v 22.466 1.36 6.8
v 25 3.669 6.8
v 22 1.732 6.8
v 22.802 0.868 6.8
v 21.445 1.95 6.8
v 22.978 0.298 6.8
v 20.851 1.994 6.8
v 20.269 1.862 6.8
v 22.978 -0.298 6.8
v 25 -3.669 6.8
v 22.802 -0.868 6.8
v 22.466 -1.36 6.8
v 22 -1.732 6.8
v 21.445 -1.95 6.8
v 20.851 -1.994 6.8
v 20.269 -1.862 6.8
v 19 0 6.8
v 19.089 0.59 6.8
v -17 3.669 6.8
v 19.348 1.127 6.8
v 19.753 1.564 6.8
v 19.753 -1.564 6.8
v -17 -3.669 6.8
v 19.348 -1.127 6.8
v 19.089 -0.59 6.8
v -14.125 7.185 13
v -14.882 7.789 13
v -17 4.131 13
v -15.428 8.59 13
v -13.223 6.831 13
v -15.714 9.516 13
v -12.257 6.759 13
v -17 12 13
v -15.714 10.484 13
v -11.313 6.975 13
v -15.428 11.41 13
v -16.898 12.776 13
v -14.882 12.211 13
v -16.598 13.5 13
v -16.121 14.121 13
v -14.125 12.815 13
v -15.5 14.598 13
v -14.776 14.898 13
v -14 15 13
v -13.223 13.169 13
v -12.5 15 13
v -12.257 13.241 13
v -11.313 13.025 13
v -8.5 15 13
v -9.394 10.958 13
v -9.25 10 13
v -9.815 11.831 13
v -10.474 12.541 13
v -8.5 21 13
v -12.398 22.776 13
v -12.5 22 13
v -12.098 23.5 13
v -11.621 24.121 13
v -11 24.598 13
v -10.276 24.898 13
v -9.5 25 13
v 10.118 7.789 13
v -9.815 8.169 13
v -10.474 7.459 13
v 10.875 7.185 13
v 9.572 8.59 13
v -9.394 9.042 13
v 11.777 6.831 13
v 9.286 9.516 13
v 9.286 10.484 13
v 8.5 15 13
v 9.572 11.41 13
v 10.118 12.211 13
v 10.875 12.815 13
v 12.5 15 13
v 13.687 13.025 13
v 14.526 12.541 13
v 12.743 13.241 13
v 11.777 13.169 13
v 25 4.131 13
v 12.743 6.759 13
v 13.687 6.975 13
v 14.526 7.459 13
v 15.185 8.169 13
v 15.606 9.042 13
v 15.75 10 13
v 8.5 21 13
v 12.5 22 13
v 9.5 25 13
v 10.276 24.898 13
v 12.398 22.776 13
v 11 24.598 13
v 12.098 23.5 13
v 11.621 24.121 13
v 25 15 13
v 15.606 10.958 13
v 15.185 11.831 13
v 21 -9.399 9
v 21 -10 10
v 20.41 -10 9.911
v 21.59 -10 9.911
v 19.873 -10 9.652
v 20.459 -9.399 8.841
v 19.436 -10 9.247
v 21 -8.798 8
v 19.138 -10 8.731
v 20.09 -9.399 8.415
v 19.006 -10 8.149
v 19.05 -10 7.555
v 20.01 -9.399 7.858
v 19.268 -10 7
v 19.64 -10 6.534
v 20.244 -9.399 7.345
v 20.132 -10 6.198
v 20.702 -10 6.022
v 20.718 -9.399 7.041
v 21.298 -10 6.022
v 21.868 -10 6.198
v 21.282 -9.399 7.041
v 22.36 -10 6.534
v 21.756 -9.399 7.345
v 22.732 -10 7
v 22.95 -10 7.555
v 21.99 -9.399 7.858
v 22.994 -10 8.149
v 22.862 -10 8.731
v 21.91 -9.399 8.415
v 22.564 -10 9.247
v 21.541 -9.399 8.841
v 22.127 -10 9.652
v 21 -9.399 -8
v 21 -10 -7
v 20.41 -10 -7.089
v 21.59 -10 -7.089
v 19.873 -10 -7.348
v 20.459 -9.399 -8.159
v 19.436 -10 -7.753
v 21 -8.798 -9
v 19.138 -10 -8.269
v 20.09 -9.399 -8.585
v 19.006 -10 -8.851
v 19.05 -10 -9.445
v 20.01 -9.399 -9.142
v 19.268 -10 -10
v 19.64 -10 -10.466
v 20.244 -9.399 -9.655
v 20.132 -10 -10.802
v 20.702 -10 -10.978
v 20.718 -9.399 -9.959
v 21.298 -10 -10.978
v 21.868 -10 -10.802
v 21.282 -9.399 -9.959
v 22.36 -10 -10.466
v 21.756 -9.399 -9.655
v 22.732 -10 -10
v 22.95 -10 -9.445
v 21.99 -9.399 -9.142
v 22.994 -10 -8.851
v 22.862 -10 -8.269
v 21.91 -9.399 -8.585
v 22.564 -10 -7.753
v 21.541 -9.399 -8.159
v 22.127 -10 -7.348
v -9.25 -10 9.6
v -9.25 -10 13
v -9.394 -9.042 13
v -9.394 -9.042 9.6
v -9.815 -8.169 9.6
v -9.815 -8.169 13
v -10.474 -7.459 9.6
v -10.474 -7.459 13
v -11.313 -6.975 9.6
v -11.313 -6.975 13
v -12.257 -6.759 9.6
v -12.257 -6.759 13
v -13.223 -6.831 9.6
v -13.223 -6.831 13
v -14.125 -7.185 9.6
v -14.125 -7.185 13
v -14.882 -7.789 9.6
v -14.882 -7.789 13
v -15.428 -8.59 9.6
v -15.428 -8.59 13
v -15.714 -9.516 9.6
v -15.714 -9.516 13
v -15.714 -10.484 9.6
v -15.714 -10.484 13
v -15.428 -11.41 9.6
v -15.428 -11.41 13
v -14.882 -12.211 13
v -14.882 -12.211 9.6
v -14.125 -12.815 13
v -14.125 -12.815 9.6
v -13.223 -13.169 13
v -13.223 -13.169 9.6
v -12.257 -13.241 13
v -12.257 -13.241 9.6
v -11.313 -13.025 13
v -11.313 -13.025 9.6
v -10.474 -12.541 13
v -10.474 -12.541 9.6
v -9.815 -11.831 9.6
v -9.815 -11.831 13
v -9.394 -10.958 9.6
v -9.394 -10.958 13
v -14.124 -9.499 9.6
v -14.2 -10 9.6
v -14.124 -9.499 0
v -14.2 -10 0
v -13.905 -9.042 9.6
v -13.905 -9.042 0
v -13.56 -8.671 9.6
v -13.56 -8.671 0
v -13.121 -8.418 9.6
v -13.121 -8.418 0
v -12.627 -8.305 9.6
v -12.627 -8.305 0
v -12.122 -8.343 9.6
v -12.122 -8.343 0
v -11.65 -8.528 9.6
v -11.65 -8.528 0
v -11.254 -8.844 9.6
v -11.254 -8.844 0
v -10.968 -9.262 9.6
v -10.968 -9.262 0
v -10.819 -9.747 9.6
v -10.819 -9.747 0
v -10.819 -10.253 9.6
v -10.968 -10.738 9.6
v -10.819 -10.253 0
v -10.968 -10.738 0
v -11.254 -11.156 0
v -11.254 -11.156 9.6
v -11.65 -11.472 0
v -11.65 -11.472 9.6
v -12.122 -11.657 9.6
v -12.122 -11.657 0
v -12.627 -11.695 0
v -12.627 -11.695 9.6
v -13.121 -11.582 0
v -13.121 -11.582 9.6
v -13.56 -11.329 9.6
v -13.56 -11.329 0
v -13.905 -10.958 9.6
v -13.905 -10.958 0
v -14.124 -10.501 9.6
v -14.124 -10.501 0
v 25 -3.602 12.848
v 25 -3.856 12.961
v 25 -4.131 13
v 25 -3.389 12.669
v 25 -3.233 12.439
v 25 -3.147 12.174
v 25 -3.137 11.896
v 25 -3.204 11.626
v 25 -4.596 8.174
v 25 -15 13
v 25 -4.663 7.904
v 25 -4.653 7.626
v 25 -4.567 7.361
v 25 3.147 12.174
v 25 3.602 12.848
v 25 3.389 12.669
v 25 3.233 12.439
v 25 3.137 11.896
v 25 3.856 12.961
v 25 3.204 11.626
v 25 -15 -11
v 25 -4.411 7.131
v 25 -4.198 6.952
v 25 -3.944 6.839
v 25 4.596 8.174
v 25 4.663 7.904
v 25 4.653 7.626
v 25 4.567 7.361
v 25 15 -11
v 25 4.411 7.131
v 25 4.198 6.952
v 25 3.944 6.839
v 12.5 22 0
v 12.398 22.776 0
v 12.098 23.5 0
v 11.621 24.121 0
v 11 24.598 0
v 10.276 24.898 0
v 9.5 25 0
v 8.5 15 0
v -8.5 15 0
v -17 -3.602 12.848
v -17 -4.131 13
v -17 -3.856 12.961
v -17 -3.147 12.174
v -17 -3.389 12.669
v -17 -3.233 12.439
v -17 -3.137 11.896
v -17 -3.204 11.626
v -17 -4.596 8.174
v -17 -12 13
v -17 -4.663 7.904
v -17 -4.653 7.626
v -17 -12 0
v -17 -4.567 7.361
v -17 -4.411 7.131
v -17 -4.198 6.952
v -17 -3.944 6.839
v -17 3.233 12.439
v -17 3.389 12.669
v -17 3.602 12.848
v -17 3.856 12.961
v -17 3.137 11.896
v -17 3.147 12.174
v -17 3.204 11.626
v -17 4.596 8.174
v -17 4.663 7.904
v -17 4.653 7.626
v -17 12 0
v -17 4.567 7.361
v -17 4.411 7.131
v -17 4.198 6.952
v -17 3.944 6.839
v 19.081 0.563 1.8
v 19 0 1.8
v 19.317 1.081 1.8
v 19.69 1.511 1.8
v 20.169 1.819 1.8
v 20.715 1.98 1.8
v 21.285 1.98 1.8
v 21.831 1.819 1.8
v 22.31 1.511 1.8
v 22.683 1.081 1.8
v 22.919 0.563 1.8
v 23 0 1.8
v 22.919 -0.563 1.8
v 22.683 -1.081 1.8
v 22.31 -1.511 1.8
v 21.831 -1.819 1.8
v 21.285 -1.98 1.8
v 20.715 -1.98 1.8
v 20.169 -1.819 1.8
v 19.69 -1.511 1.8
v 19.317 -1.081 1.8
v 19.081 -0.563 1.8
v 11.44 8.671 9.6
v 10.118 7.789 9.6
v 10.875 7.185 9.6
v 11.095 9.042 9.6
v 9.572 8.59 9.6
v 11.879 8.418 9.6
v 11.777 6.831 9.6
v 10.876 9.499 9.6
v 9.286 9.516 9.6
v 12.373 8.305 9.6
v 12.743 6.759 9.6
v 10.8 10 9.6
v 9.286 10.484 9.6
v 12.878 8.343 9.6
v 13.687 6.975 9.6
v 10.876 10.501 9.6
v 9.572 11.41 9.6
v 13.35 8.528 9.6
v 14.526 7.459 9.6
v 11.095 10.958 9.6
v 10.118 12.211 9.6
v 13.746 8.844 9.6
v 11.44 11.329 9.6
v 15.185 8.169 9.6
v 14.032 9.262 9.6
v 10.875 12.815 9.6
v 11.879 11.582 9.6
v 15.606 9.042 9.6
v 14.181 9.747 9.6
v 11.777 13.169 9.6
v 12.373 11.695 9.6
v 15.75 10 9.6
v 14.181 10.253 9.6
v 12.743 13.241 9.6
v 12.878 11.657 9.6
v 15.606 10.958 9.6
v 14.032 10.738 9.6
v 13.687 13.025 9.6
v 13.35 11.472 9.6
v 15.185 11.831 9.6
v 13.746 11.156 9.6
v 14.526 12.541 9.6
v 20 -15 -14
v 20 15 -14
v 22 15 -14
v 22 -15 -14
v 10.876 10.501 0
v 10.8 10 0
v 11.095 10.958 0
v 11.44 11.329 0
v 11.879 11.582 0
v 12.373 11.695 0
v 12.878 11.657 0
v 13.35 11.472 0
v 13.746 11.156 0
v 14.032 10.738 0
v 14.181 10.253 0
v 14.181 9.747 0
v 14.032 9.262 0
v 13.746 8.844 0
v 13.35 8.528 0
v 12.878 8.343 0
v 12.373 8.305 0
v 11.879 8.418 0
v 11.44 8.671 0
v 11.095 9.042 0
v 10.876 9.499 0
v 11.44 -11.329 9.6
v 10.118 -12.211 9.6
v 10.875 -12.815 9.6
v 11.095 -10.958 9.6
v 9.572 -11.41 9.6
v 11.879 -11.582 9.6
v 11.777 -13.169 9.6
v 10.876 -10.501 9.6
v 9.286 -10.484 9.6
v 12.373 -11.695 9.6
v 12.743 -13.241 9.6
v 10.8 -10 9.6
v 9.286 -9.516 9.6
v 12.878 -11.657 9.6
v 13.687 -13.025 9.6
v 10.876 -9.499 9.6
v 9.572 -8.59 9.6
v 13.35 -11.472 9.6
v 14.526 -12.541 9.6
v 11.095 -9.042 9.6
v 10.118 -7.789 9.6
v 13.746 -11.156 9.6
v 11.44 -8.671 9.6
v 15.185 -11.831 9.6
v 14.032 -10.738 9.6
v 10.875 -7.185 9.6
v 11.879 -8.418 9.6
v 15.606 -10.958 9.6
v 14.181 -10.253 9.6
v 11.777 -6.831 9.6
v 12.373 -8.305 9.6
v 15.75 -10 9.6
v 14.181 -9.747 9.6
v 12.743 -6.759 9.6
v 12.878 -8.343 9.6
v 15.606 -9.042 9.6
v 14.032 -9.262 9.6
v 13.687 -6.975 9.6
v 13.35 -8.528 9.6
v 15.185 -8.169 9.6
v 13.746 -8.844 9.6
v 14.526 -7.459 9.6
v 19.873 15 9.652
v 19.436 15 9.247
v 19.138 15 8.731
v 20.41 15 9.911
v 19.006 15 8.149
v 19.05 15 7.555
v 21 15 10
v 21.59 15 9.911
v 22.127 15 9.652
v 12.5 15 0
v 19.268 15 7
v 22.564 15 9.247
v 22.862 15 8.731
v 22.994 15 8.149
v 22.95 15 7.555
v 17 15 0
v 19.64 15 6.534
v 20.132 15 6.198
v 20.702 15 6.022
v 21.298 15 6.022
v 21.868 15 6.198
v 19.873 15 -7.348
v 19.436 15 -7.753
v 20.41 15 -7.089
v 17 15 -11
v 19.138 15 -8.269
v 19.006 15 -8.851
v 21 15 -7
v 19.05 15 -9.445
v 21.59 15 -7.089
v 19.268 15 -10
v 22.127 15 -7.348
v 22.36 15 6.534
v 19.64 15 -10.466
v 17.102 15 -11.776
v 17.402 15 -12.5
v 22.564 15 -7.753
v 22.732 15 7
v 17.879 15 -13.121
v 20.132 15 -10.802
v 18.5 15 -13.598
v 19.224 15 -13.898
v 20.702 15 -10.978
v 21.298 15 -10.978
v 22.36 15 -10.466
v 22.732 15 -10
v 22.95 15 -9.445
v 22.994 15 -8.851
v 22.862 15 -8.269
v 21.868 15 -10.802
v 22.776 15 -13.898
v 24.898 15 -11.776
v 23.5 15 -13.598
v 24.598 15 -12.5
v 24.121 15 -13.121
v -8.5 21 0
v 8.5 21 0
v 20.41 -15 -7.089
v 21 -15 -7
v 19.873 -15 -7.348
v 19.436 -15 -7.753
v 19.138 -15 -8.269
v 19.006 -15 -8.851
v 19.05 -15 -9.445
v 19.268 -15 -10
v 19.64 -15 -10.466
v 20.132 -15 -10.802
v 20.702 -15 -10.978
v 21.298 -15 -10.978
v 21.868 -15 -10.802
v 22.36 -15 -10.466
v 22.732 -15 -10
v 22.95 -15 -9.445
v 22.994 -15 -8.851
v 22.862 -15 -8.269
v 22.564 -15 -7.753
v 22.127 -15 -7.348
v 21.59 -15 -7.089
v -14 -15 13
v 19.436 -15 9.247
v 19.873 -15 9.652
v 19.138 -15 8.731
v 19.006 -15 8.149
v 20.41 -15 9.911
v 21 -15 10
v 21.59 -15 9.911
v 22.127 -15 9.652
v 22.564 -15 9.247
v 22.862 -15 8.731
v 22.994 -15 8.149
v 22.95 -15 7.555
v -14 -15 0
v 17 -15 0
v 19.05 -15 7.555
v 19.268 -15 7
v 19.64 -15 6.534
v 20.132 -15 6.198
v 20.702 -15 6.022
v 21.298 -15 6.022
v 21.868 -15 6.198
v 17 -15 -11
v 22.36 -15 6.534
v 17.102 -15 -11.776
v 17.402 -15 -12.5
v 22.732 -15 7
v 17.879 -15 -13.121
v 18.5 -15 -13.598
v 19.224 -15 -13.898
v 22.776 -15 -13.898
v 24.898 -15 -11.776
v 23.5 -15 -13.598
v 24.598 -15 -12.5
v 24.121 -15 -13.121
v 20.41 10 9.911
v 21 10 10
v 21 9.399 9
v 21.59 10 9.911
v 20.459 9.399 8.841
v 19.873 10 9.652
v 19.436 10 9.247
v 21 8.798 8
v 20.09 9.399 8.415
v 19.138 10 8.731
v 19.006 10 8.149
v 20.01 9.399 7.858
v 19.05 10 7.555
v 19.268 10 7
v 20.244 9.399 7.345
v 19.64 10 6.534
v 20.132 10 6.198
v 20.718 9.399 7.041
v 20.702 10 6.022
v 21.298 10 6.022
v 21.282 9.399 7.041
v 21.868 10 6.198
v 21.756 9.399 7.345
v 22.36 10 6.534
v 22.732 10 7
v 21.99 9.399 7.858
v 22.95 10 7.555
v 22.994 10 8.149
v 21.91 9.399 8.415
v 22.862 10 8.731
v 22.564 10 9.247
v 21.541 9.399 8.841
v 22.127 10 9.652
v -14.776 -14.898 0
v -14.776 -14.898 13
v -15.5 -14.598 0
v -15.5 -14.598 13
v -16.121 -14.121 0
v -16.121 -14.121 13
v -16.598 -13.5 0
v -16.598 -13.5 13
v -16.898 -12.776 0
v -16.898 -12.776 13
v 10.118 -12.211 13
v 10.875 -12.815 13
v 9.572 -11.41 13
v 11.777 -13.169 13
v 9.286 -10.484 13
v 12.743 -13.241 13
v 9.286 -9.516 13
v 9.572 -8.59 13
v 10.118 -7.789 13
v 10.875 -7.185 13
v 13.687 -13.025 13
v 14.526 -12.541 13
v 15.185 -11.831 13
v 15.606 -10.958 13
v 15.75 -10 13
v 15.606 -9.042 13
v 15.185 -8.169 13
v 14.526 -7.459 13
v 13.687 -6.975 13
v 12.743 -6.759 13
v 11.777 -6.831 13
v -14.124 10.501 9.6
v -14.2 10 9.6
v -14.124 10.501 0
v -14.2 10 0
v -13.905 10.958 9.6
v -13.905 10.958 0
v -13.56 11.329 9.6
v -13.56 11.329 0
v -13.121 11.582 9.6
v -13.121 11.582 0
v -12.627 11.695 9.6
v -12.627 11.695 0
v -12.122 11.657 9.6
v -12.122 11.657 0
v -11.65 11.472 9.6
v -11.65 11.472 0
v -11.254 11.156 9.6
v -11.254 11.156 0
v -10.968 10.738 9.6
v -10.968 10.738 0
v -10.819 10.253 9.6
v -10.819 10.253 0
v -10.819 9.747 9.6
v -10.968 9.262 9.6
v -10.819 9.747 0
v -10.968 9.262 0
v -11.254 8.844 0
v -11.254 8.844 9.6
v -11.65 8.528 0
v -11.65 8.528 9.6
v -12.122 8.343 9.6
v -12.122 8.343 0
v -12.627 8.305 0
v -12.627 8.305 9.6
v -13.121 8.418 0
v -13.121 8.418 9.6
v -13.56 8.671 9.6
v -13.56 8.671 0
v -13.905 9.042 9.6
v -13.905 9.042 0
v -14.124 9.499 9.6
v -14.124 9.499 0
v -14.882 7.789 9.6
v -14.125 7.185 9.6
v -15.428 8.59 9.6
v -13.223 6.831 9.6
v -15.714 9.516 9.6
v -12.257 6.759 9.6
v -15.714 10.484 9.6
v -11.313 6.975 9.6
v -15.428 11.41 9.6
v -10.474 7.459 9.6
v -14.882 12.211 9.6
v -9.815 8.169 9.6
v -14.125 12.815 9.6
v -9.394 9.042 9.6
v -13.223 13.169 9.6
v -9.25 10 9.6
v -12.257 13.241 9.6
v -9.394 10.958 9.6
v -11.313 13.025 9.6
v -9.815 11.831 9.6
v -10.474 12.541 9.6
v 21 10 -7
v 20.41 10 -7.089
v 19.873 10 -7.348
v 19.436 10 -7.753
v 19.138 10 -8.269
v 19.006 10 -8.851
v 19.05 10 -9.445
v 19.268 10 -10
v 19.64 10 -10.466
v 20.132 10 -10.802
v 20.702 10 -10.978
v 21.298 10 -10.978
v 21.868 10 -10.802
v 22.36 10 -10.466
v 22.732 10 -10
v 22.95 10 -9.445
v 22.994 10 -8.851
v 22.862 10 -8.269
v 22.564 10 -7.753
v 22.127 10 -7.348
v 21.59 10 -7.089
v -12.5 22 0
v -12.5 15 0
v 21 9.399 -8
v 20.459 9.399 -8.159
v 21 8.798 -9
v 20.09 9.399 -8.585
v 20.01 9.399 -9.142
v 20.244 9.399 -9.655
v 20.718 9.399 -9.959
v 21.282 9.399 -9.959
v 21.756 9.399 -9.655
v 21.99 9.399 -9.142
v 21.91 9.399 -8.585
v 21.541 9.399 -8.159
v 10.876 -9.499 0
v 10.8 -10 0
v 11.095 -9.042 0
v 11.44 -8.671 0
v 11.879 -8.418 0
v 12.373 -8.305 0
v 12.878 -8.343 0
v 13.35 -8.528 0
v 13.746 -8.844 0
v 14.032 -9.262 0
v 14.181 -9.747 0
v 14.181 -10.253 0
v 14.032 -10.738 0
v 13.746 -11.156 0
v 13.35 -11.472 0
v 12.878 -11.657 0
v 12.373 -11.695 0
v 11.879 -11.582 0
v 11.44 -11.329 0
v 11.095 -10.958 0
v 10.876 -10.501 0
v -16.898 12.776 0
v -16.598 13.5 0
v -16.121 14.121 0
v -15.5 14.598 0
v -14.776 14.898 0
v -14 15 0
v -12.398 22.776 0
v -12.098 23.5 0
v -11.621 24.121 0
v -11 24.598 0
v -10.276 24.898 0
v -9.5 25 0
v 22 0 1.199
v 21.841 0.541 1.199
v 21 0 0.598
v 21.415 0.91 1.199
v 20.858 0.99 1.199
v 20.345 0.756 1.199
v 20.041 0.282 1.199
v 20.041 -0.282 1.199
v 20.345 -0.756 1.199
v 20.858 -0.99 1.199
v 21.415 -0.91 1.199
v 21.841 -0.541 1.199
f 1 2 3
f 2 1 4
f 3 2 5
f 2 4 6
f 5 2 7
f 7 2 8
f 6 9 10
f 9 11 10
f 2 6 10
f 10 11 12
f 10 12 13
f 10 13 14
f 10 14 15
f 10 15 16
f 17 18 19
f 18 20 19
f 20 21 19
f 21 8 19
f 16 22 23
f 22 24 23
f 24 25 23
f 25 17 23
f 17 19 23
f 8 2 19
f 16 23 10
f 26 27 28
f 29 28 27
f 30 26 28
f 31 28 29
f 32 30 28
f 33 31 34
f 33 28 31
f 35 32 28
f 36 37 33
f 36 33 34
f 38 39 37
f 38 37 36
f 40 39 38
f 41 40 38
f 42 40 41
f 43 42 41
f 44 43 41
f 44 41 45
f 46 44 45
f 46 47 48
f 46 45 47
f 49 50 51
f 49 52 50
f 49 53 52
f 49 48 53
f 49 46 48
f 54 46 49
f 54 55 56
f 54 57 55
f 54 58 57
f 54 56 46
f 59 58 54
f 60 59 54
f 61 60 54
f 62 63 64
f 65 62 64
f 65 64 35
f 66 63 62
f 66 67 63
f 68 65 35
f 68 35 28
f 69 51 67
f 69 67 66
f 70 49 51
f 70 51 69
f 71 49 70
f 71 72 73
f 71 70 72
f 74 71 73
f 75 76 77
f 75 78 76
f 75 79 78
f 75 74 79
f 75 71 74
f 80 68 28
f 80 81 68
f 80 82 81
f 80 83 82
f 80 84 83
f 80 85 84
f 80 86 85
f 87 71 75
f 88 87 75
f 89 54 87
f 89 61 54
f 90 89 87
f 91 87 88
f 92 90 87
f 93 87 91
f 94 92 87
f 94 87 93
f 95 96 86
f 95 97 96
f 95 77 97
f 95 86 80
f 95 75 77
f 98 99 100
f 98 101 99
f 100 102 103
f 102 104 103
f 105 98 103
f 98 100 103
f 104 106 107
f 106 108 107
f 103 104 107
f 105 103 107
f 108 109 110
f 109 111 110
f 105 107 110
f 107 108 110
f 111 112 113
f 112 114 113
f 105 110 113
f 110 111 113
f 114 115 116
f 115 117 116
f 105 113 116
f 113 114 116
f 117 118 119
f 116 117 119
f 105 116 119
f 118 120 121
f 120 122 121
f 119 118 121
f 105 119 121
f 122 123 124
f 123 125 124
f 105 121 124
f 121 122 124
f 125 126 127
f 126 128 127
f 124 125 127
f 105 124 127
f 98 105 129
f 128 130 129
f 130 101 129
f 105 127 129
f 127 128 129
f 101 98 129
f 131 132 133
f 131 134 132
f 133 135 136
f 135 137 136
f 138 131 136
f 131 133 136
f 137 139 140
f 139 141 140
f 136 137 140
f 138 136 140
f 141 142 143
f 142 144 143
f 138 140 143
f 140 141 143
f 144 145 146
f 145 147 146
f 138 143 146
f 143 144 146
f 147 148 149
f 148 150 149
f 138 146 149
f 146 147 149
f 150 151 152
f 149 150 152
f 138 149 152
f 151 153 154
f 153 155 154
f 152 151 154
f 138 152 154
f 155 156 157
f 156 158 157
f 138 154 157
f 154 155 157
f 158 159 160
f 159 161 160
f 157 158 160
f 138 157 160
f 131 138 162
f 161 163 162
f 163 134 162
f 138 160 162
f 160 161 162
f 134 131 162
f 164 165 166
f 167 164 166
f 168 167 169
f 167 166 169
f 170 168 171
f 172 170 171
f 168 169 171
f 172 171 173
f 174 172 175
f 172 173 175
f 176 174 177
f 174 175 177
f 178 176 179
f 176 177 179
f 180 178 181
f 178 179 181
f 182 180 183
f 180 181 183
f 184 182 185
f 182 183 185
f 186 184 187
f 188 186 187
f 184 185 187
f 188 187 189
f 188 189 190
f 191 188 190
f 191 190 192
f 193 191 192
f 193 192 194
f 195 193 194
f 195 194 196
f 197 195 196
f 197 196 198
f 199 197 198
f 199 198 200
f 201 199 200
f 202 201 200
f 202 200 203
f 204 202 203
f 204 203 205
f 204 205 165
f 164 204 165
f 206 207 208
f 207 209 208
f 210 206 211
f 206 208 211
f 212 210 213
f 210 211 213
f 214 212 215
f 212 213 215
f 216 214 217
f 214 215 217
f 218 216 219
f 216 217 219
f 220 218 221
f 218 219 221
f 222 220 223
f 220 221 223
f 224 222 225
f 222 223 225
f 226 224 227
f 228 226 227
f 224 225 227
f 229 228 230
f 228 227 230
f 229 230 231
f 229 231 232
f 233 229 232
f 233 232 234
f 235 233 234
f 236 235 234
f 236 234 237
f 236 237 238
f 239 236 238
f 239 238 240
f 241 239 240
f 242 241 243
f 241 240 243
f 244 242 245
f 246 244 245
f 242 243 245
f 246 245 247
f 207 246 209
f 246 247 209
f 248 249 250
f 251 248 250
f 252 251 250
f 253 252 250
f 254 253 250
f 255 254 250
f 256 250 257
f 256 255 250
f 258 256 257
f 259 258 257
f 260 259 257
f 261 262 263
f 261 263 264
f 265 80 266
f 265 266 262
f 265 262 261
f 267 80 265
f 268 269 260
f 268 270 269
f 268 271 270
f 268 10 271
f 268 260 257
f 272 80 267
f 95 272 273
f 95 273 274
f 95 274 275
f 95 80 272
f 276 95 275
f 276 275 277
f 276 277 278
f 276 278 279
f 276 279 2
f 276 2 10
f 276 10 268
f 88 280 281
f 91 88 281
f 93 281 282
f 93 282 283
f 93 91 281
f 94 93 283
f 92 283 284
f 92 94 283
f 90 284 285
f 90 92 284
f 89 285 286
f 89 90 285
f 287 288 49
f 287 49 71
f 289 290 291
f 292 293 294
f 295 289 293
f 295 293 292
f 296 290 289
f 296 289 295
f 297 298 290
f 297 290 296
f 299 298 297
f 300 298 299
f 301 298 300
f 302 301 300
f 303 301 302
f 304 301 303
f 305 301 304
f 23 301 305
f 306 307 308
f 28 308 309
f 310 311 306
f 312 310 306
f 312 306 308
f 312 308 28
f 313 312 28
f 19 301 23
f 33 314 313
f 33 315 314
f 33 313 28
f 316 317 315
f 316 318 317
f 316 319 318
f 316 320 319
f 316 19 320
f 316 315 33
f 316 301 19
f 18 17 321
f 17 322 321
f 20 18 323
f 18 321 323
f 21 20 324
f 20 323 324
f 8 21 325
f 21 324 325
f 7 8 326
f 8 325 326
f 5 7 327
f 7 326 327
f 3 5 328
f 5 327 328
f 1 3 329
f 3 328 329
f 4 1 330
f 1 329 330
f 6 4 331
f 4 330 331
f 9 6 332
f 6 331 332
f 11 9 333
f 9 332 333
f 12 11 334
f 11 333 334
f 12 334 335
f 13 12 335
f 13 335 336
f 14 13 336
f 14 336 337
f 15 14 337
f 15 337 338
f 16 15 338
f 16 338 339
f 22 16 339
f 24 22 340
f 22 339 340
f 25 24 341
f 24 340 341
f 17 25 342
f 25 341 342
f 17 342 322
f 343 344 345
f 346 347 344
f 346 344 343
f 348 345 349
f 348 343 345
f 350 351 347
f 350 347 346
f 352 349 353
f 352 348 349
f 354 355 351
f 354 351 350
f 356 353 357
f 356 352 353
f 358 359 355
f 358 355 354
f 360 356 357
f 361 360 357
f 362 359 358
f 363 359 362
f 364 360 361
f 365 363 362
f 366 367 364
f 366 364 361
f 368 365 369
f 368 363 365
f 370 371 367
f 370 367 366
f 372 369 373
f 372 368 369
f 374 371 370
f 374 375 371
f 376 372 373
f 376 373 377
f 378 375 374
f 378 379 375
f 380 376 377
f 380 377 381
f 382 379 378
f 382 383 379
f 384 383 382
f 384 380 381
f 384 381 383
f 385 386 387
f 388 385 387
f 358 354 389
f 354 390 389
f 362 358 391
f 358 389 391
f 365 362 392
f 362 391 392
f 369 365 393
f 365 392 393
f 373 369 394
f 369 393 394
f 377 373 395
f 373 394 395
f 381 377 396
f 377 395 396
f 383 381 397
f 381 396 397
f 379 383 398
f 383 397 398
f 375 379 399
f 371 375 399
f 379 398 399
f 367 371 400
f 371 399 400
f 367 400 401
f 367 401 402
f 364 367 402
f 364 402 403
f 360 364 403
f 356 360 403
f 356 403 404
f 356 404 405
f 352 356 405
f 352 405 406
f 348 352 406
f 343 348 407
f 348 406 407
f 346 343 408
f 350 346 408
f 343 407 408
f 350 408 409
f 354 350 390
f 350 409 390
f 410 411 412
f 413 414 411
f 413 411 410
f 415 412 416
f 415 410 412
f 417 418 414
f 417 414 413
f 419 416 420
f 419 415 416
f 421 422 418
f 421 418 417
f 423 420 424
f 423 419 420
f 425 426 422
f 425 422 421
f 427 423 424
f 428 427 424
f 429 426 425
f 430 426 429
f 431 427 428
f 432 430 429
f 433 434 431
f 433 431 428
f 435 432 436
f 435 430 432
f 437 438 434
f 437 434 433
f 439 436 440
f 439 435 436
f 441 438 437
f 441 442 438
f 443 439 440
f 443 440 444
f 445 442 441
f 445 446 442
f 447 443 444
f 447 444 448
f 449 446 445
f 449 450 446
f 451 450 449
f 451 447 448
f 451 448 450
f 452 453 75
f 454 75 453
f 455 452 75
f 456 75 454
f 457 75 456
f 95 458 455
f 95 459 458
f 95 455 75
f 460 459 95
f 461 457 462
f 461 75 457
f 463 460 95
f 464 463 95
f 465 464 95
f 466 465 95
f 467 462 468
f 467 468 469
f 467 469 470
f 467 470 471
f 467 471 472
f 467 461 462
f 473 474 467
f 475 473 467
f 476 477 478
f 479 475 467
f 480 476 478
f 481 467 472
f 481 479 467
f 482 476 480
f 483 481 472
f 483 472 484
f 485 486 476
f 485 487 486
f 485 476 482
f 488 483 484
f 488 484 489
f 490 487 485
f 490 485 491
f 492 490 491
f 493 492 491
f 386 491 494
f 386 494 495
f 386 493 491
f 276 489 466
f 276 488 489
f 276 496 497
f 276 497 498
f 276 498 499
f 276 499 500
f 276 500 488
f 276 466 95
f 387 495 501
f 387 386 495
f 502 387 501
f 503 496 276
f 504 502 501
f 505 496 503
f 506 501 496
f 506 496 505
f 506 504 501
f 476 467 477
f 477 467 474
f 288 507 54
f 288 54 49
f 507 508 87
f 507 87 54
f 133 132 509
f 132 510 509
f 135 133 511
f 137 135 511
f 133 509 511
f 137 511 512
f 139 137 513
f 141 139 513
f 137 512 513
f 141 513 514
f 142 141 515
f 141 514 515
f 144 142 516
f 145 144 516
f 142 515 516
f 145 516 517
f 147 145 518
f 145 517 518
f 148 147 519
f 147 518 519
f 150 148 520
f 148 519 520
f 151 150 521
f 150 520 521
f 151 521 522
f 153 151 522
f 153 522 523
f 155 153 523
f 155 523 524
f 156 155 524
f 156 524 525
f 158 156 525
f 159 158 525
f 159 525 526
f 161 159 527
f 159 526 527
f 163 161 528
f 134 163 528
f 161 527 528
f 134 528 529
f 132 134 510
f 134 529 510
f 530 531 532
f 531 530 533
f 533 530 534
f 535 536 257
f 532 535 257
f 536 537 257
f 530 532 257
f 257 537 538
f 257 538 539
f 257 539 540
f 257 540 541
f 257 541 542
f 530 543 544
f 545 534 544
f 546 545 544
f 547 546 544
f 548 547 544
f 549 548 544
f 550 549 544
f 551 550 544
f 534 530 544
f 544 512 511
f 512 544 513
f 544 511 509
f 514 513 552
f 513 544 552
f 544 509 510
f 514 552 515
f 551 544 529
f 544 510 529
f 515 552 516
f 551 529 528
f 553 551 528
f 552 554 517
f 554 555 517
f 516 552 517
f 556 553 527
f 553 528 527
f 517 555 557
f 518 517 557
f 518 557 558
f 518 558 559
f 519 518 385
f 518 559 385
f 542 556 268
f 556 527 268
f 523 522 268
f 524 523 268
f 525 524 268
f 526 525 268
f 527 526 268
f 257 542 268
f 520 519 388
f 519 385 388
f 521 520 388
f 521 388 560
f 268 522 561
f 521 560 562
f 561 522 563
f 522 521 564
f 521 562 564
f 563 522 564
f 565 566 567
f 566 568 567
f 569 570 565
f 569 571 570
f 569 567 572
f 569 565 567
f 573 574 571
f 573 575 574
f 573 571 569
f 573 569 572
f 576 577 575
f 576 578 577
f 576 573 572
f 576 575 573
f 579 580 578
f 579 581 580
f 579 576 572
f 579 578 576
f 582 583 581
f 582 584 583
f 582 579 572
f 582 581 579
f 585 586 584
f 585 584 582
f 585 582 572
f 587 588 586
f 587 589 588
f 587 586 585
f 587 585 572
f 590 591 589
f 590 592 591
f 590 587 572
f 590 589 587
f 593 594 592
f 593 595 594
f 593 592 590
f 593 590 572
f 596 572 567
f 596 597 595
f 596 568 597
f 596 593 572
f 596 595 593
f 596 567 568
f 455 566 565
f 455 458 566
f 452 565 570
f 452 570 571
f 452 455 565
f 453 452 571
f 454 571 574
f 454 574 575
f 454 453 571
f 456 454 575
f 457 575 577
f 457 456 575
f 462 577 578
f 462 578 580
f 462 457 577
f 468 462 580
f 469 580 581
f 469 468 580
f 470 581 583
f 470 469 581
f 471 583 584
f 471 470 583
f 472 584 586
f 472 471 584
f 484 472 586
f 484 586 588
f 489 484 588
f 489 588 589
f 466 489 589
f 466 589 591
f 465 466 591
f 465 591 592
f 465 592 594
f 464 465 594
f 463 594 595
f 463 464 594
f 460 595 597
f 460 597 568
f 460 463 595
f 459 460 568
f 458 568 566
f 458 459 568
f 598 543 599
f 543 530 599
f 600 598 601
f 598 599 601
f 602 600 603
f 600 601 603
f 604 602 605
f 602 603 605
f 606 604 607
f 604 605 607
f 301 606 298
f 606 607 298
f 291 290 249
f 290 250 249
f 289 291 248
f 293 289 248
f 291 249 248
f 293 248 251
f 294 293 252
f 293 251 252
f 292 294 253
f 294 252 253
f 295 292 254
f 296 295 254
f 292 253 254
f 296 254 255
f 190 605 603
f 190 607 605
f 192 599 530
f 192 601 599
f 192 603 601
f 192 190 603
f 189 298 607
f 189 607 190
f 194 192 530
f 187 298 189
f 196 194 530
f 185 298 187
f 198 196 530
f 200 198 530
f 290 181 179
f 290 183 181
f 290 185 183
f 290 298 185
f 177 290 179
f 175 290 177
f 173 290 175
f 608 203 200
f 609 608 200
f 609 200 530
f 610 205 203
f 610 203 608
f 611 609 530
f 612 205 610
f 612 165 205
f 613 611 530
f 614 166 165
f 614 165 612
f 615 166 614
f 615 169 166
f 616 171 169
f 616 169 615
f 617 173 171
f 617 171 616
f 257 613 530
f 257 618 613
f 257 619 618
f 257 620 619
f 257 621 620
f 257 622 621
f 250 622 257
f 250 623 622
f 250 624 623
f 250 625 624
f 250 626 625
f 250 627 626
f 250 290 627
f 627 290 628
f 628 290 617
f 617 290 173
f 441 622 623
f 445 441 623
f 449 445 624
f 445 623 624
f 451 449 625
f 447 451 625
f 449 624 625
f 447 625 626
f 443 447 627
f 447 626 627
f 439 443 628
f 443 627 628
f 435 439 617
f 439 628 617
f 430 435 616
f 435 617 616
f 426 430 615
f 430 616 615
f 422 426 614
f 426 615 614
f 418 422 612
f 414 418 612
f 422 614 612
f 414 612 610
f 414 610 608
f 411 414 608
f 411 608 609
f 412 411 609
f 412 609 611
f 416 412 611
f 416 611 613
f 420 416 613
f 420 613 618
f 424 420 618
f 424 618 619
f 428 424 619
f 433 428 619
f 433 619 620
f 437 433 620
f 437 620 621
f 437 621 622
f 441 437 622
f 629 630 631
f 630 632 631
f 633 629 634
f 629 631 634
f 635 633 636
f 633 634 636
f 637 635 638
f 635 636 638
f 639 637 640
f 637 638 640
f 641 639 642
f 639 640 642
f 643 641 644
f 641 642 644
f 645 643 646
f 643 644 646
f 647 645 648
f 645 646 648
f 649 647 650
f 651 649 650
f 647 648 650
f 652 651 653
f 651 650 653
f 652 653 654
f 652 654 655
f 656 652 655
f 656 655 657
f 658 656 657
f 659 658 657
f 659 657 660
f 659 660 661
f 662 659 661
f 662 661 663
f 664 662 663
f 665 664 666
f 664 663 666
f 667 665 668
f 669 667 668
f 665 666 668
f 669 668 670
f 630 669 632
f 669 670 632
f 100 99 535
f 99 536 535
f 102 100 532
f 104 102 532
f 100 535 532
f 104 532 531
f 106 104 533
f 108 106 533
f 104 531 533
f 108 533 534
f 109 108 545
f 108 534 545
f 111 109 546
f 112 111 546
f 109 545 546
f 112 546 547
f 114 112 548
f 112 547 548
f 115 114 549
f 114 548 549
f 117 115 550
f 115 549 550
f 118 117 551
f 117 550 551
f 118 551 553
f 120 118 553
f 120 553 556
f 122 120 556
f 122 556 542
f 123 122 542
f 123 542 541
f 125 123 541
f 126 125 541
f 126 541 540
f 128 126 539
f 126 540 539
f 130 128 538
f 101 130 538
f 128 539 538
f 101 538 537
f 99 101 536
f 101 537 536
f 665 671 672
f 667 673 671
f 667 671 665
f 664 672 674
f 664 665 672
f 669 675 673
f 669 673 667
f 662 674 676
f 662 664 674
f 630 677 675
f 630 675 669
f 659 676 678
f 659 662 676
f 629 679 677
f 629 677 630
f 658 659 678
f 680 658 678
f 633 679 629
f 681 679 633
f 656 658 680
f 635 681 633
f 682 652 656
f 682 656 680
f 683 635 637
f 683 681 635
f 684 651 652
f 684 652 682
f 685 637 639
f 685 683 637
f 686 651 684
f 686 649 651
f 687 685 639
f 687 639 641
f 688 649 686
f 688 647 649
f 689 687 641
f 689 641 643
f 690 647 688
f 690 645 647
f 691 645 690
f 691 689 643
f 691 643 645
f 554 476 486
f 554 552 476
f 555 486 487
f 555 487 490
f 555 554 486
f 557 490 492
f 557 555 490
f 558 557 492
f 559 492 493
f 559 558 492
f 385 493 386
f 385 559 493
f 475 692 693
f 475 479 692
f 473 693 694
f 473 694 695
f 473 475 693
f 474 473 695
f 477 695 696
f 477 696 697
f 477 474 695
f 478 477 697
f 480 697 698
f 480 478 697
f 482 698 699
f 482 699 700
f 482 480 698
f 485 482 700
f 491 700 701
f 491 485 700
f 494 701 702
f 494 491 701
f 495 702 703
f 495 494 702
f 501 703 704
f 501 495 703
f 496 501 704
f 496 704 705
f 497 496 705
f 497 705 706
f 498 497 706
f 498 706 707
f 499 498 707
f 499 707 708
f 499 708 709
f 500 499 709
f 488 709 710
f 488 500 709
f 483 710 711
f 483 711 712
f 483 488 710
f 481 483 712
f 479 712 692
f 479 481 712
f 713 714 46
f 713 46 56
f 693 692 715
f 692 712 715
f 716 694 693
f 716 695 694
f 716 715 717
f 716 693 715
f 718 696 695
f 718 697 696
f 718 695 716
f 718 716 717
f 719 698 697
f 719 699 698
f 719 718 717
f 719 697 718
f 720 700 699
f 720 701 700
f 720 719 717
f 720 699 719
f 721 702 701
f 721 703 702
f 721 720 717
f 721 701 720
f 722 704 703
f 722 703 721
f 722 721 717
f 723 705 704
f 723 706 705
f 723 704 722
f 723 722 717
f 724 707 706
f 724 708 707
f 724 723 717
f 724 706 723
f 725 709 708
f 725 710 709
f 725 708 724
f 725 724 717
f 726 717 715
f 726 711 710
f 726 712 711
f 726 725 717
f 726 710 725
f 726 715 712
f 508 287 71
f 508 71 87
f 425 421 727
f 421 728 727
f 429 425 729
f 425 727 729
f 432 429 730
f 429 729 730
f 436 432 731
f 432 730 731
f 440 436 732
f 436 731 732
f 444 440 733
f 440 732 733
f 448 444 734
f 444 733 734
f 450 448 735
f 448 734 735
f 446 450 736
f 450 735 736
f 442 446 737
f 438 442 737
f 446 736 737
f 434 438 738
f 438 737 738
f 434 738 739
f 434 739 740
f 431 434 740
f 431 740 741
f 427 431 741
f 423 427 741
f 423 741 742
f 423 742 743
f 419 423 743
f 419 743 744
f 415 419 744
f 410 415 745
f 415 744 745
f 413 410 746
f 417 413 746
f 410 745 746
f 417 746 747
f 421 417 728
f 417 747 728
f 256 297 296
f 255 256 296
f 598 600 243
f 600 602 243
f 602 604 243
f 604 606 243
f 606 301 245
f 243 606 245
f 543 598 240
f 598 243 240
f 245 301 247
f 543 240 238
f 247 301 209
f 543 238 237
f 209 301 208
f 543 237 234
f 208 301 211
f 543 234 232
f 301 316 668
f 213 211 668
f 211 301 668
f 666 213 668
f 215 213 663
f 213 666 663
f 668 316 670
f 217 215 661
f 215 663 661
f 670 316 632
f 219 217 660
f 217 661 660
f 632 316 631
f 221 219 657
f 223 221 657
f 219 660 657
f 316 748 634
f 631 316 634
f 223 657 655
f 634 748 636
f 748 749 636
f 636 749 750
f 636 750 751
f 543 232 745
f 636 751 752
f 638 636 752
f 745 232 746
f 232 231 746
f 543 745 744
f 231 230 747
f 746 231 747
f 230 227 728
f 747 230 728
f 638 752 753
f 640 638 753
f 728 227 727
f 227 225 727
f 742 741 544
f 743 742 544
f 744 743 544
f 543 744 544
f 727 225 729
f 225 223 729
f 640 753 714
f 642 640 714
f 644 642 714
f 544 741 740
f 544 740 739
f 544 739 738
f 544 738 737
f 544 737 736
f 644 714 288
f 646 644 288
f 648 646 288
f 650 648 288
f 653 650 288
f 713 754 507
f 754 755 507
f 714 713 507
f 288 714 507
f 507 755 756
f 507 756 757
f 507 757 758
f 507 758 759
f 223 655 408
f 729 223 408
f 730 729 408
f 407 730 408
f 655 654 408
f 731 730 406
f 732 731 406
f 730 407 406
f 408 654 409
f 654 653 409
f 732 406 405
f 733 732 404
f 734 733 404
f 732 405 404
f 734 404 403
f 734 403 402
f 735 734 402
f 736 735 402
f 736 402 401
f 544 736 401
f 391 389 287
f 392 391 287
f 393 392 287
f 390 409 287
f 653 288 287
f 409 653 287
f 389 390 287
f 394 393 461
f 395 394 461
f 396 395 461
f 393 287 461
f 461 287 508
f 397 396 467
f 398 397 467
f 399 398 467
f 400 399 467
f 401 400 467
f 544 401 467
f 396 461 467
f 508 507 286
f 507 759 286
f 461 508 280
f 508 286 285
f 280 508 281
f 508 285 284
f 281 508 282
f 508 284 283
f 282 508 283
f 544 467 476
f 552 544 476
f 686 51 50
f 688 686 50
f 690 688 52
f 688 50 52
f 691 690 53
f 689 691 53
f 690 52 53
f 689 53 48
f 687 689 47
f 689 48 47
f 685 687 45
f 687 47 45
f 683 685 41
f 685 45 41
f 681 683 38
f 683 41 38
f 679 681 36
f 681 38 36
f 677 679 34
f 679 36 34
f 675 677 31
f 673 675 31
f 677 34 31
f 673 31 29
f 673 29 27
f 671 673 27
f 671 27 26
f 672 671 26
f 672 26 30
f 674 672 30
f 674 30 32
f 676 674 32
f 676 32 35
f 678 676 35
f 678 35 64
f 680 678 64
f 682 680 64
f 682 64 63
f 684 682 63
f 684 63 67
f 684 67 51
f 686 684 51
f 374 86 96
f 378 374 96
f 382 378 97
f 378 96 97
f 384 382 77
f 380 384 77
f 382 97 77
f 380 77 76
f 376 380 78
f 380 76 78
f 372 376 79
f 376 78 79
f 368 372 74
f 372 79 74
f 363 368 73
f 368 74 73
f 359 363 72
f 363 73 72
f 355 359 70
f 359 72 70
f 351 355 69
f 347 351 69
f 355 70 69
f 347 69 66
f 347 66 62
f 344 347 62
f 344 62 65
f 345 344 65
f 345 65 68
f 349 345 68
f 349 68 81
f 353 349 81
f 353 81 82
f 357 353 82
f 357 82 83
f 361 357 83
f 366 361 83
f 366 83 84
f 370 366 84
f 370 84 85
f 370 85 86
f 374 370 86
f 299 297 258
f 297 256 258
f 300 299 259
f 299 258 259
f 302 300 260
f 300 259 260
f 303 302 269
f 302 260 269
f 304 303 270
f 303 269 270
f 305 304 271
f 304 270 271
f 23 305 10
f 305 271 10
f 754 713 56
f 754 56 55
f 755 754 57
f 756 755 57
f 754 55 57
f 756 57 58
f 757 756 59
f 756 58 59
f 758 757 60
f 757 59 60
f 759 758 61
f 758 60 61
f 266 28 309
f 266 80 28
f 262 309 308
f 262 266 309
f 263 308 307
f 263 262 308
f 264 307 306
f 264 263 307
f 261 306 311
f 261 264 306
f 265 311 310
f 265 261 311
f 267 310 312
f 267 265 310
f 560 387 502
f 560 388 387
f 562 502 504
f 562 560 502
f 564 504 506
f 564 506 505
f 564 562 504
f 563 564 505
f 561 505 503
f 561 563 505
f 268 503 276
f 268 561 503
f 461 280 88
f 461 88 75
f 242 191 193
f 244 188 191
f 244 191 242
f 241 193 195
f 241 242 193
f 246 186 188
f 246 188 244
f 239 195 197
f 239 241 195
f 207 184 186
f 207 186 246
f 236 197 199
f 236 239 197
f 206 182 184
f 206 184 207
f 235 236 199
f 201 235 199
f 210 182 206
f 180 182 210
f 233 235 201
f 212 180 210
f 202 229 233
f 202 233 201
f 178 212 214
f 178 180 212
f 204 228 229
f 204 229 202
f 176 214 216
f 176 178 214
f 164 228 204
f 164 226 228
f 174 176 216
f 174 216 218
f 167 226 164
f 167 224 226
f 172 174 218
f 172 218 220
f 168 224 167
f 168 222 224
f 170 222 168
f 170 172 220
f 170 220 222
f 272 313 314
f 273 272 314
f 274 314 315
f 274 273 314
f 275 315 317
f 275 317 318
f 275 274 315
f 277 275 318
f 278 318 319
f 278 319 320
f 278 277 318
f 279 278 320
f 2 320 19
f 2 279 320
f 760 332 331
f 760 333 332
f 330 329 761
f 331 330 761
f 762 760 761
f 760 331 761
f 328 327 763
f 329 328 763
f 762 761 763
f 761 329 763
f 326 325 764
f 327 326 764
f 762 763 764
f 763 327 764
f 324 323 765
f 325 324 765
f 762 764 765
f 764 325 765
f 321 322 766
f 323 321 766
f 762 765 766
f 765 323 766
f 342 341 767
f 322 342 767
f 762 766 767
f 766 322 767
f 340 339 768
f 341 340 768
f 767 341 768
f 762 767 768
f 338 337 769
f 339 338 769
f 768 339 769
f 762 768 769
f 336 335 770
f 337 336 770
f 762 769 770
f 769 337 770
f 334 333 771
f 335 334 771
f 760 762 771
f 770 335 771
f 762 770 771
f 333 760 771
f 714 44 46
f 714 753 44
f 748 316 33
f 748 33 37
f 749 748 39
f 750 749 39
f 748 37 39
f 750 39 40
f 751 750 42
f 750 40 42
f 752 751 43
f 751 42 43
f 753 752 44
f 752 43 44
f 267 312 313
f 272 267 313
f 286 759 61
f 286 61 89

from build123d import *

# Parameters (mm, degrees)
SKIZZE1_W                                            = 34
SKIZZE1_H                                            = 30
AUFSATZ_LINEAR_AUSTRAGEN1_DEPTH                      = 13
STIRNSENKUNG_F_R_M3_ZYLINDERSCHRAUBE_MIT_D           = 3.4
STIRNSENKUNG_F_R_M3_ZYLINDERSCHRAUBE_MIT_CBORE_D     = 6.5
STIRNSENKUNG_F_R_M3_ZYLINDERSCHRAUBE_MIT_CBORE_DEPTH = 3.4
SKIZZE4_W                                            = 8
SKIZZE4_H                                            = 27
AUFSATZ_LINEAR_AUSTRAGEN2_DEPTH                      = 30
F_4_0_4_DURCHMESSER_BOHRUNG1_AT_2_COUNT              = 2
F_4_0_4_DURCHMESSER_BOHRUNG1_AT_2_PITCH              = 17
SCHNITT_LINEAR_AUSTRAGEN1_DEPTH                      = 43
AUFSATZ_LINEAR_AUSTRAGEN3_DEPTH                      = 13
VERRUNDUNG2_R                                        = 3
VERRUNDUNG1_R                                        = 3
VERRUNDUNG4_R                                        = 1
F_4_0_4_DURCHMESSER_BOHRUNG2_D                       = 4
F_4_0_4_DURCHMESSER_BOHRUNG2_DEPTH                   = 5
F_4_0_4_DURCHMESSER_BOHRUNG2_TIP                     = 1.201721238


with BuildPart() as part:
    # Skizze1 → Aufsatz-Linear austragen1 (new body)
    with BuildSketch(Plane.XY):
        Rectangle(SKIZZE1_W, SKIZZE1_H)
    extrude(amount=AUFSATZ_LINEAR_AUSTRAGEN1_DEPTH)

    # Stirnsenkung für M3 Zylinderschraube mit Innensechskant1 (through all)
    with Locations(Plane.XY.offset(13)):
        with Locations((-12.5, 10), (-12.5, -10), (12.5, -10), (12.5, 10)):
            CounterBoreHole(STIRNSENKUNG_F_R_M3_ZYLINDERSCHRAUBE_MIT_D / 2, STIRNSENKUNG_F_R_M3_ZYLINDERSCHRAUBE_MIT_CBORE_D / 2, STIRNSENKUNG_F_R_M3_ZYLINDERSCHRAUBE_MIT_CBORE_DEPTH)

    # Skizze4 → Aufsatz-Linear austragen2 (add, through all)
    with BuildSketch(Plane(origin=(0, 15, 0), x_dir=(1, 0, 0), z_dir=(0, 1, 0))):
        with Locations((21, 0.5)):
            Rectangle(SKIZZE4_W, SKIZZE4_H)
    extrude(amount=-AUFSATZ_LINEAR_AUSTRAGEN2_DEPTH)

    # Skizze6 → Ø4.0 (4) Durchmesser Bohrung1 (revolve, cut)
    with BuildSketch(Plane(origin=(21, 15, 8), x_dir=(0, 0, 1), z_dir=(1, 0, 0))):
        Polygon((0, 0), (0, 6.201721238), (2, 5), (2, 0), align=None)
    f_4_0_4_durchmesser_bohrung1 = revolve(axis=Axis((21, 21.35, 8), (0, -1, 0)), mode=Mode.SUBTRACT)

    # Ø4.0 (4) Durchmesser Bohrung1 at 2: Ø4.0 (4) Durchmesser Bohrung1 ×2
    with Locations(*[(0, 0, -i * F_4_0_4_DURCHMESSER_BOHRUNG1_AT_2_PITCH) for i in range(1, F_4_0_4_DURCHMESSER_BOHRUNG1_AT_2_COUNT)]):
        add(f_4_0_4_durchmesser_bohrung1, mode=Mode.SUBTRACT)

    # Spiegeln1: Ø4.0 (4) Durchmesser Bohrung1 across plane
    add(f_4_0_4_durchmesser_bohrung1.mirror(Plane.ZX), mode=Mode.SUBTRACT)

    # Spiegeln1 copy 1 sketch → Spiegeln1 copy 1 (revolve, cut)
    with BuildSketch(Plane(origin=(21, -15, -9), x_dir=(0, 0, 1), z_dir=(1, 0, 0))):
        Polygon((0, 0), (0, -6.201721238), (2, -5), (2, 0), align=None)
    revolve(axis=Axis((21, -21.35, -9), (0, -1, 0)), mode=Mode.SUBTRACT)

    # Skizze7 → Schnitt-Linear austragen1 (cut, through all)
    with BuildSketch(Plane.ZY.offset(17)):
        Polygon((13, 2.65), (6.8, 5.15), (6.8, -5.15), (13, -2.65), align=None)
    extrude(amount=-SCHNITT_LINEAR_AUSTRAGEN1_DEPTH, mode=Mode.SUBTRACT)

    # Skizze10 → Aufsatz-Linear austragen3 (add)
    with BuildSketch(Plane(origin=(0, 0, 0), x_dir=(-1, 0, 0), z_dir=(0, 0, -1))):
        Polygon((-12.5, 15), (-8.5, 15), (-8.5, 21), (8.5, 21), (8.5, 15), (12.5, 15), (12.5, 25), (-12.5, 25), align=None)
    extrude(amount=-AUFSATZ_LINEAR_AUSTRAGEN3_DEPTH)

    # Verrundung2
    verrundung2_edges = [part.edges().sort_by_distance(p)[0] for p in [
        (-17, 15, 6.5),
        (-17, -15, 6.5),
        (-12.5, 25, 6.5),
        (12.5, 25, 6.5),
    ]]
    fillet(verrundung2_edges, radius=VERRUNDUNG2_R)

    # Verrundung1
    verrundung1_edges = [part.edges().sort_by_distance(p)[0] for p in [
        (17, 0, -14),
        (25, 0, -14),
    ]]
    fillet(verrundung1_edges, radius=VERRUNDUNG1_R)

    # Verrundung4
    verrundung4_edges = [part.edges().sort_by_distance(p)[0] for p in [
        (4, 2.65, 13),
        (4, -2.65, 13),
        (4, -5.15, 6.8),
        (4, 5.15, 6.8),
    ]]
    fillet(verrundung4_edges, radius=VERRUNDUNG4_R)

    # Ø4.0 (4) Durchmesser Bohrung2
    with Locations(Plane.XY.offset(6.8)):
        with Locations((21, 0)):
            Hole(F_4_0_4_DURCHMESSER_BOHRUNG2_D / 2, depth=F_4_0_4_DURCHMESSER_BOHRUNG2_DEPTH)
            with Locations((0, 0, -(F_4_0_4_DURCHMESSER_BOHRUNG2_DEPTH + F_4_0_4_DURCHMESSER_BOHRUNG2_TIP / 2))):  # 118° drill point
                Cone(0, F_4_0_4_DURCHMESSER_BOHRUNG2_D / 2, F_4_0_4_DURCHMESSER_BOHRUNG2_TIP, mode=Mode.SUBTRACT)


solid = part.part
